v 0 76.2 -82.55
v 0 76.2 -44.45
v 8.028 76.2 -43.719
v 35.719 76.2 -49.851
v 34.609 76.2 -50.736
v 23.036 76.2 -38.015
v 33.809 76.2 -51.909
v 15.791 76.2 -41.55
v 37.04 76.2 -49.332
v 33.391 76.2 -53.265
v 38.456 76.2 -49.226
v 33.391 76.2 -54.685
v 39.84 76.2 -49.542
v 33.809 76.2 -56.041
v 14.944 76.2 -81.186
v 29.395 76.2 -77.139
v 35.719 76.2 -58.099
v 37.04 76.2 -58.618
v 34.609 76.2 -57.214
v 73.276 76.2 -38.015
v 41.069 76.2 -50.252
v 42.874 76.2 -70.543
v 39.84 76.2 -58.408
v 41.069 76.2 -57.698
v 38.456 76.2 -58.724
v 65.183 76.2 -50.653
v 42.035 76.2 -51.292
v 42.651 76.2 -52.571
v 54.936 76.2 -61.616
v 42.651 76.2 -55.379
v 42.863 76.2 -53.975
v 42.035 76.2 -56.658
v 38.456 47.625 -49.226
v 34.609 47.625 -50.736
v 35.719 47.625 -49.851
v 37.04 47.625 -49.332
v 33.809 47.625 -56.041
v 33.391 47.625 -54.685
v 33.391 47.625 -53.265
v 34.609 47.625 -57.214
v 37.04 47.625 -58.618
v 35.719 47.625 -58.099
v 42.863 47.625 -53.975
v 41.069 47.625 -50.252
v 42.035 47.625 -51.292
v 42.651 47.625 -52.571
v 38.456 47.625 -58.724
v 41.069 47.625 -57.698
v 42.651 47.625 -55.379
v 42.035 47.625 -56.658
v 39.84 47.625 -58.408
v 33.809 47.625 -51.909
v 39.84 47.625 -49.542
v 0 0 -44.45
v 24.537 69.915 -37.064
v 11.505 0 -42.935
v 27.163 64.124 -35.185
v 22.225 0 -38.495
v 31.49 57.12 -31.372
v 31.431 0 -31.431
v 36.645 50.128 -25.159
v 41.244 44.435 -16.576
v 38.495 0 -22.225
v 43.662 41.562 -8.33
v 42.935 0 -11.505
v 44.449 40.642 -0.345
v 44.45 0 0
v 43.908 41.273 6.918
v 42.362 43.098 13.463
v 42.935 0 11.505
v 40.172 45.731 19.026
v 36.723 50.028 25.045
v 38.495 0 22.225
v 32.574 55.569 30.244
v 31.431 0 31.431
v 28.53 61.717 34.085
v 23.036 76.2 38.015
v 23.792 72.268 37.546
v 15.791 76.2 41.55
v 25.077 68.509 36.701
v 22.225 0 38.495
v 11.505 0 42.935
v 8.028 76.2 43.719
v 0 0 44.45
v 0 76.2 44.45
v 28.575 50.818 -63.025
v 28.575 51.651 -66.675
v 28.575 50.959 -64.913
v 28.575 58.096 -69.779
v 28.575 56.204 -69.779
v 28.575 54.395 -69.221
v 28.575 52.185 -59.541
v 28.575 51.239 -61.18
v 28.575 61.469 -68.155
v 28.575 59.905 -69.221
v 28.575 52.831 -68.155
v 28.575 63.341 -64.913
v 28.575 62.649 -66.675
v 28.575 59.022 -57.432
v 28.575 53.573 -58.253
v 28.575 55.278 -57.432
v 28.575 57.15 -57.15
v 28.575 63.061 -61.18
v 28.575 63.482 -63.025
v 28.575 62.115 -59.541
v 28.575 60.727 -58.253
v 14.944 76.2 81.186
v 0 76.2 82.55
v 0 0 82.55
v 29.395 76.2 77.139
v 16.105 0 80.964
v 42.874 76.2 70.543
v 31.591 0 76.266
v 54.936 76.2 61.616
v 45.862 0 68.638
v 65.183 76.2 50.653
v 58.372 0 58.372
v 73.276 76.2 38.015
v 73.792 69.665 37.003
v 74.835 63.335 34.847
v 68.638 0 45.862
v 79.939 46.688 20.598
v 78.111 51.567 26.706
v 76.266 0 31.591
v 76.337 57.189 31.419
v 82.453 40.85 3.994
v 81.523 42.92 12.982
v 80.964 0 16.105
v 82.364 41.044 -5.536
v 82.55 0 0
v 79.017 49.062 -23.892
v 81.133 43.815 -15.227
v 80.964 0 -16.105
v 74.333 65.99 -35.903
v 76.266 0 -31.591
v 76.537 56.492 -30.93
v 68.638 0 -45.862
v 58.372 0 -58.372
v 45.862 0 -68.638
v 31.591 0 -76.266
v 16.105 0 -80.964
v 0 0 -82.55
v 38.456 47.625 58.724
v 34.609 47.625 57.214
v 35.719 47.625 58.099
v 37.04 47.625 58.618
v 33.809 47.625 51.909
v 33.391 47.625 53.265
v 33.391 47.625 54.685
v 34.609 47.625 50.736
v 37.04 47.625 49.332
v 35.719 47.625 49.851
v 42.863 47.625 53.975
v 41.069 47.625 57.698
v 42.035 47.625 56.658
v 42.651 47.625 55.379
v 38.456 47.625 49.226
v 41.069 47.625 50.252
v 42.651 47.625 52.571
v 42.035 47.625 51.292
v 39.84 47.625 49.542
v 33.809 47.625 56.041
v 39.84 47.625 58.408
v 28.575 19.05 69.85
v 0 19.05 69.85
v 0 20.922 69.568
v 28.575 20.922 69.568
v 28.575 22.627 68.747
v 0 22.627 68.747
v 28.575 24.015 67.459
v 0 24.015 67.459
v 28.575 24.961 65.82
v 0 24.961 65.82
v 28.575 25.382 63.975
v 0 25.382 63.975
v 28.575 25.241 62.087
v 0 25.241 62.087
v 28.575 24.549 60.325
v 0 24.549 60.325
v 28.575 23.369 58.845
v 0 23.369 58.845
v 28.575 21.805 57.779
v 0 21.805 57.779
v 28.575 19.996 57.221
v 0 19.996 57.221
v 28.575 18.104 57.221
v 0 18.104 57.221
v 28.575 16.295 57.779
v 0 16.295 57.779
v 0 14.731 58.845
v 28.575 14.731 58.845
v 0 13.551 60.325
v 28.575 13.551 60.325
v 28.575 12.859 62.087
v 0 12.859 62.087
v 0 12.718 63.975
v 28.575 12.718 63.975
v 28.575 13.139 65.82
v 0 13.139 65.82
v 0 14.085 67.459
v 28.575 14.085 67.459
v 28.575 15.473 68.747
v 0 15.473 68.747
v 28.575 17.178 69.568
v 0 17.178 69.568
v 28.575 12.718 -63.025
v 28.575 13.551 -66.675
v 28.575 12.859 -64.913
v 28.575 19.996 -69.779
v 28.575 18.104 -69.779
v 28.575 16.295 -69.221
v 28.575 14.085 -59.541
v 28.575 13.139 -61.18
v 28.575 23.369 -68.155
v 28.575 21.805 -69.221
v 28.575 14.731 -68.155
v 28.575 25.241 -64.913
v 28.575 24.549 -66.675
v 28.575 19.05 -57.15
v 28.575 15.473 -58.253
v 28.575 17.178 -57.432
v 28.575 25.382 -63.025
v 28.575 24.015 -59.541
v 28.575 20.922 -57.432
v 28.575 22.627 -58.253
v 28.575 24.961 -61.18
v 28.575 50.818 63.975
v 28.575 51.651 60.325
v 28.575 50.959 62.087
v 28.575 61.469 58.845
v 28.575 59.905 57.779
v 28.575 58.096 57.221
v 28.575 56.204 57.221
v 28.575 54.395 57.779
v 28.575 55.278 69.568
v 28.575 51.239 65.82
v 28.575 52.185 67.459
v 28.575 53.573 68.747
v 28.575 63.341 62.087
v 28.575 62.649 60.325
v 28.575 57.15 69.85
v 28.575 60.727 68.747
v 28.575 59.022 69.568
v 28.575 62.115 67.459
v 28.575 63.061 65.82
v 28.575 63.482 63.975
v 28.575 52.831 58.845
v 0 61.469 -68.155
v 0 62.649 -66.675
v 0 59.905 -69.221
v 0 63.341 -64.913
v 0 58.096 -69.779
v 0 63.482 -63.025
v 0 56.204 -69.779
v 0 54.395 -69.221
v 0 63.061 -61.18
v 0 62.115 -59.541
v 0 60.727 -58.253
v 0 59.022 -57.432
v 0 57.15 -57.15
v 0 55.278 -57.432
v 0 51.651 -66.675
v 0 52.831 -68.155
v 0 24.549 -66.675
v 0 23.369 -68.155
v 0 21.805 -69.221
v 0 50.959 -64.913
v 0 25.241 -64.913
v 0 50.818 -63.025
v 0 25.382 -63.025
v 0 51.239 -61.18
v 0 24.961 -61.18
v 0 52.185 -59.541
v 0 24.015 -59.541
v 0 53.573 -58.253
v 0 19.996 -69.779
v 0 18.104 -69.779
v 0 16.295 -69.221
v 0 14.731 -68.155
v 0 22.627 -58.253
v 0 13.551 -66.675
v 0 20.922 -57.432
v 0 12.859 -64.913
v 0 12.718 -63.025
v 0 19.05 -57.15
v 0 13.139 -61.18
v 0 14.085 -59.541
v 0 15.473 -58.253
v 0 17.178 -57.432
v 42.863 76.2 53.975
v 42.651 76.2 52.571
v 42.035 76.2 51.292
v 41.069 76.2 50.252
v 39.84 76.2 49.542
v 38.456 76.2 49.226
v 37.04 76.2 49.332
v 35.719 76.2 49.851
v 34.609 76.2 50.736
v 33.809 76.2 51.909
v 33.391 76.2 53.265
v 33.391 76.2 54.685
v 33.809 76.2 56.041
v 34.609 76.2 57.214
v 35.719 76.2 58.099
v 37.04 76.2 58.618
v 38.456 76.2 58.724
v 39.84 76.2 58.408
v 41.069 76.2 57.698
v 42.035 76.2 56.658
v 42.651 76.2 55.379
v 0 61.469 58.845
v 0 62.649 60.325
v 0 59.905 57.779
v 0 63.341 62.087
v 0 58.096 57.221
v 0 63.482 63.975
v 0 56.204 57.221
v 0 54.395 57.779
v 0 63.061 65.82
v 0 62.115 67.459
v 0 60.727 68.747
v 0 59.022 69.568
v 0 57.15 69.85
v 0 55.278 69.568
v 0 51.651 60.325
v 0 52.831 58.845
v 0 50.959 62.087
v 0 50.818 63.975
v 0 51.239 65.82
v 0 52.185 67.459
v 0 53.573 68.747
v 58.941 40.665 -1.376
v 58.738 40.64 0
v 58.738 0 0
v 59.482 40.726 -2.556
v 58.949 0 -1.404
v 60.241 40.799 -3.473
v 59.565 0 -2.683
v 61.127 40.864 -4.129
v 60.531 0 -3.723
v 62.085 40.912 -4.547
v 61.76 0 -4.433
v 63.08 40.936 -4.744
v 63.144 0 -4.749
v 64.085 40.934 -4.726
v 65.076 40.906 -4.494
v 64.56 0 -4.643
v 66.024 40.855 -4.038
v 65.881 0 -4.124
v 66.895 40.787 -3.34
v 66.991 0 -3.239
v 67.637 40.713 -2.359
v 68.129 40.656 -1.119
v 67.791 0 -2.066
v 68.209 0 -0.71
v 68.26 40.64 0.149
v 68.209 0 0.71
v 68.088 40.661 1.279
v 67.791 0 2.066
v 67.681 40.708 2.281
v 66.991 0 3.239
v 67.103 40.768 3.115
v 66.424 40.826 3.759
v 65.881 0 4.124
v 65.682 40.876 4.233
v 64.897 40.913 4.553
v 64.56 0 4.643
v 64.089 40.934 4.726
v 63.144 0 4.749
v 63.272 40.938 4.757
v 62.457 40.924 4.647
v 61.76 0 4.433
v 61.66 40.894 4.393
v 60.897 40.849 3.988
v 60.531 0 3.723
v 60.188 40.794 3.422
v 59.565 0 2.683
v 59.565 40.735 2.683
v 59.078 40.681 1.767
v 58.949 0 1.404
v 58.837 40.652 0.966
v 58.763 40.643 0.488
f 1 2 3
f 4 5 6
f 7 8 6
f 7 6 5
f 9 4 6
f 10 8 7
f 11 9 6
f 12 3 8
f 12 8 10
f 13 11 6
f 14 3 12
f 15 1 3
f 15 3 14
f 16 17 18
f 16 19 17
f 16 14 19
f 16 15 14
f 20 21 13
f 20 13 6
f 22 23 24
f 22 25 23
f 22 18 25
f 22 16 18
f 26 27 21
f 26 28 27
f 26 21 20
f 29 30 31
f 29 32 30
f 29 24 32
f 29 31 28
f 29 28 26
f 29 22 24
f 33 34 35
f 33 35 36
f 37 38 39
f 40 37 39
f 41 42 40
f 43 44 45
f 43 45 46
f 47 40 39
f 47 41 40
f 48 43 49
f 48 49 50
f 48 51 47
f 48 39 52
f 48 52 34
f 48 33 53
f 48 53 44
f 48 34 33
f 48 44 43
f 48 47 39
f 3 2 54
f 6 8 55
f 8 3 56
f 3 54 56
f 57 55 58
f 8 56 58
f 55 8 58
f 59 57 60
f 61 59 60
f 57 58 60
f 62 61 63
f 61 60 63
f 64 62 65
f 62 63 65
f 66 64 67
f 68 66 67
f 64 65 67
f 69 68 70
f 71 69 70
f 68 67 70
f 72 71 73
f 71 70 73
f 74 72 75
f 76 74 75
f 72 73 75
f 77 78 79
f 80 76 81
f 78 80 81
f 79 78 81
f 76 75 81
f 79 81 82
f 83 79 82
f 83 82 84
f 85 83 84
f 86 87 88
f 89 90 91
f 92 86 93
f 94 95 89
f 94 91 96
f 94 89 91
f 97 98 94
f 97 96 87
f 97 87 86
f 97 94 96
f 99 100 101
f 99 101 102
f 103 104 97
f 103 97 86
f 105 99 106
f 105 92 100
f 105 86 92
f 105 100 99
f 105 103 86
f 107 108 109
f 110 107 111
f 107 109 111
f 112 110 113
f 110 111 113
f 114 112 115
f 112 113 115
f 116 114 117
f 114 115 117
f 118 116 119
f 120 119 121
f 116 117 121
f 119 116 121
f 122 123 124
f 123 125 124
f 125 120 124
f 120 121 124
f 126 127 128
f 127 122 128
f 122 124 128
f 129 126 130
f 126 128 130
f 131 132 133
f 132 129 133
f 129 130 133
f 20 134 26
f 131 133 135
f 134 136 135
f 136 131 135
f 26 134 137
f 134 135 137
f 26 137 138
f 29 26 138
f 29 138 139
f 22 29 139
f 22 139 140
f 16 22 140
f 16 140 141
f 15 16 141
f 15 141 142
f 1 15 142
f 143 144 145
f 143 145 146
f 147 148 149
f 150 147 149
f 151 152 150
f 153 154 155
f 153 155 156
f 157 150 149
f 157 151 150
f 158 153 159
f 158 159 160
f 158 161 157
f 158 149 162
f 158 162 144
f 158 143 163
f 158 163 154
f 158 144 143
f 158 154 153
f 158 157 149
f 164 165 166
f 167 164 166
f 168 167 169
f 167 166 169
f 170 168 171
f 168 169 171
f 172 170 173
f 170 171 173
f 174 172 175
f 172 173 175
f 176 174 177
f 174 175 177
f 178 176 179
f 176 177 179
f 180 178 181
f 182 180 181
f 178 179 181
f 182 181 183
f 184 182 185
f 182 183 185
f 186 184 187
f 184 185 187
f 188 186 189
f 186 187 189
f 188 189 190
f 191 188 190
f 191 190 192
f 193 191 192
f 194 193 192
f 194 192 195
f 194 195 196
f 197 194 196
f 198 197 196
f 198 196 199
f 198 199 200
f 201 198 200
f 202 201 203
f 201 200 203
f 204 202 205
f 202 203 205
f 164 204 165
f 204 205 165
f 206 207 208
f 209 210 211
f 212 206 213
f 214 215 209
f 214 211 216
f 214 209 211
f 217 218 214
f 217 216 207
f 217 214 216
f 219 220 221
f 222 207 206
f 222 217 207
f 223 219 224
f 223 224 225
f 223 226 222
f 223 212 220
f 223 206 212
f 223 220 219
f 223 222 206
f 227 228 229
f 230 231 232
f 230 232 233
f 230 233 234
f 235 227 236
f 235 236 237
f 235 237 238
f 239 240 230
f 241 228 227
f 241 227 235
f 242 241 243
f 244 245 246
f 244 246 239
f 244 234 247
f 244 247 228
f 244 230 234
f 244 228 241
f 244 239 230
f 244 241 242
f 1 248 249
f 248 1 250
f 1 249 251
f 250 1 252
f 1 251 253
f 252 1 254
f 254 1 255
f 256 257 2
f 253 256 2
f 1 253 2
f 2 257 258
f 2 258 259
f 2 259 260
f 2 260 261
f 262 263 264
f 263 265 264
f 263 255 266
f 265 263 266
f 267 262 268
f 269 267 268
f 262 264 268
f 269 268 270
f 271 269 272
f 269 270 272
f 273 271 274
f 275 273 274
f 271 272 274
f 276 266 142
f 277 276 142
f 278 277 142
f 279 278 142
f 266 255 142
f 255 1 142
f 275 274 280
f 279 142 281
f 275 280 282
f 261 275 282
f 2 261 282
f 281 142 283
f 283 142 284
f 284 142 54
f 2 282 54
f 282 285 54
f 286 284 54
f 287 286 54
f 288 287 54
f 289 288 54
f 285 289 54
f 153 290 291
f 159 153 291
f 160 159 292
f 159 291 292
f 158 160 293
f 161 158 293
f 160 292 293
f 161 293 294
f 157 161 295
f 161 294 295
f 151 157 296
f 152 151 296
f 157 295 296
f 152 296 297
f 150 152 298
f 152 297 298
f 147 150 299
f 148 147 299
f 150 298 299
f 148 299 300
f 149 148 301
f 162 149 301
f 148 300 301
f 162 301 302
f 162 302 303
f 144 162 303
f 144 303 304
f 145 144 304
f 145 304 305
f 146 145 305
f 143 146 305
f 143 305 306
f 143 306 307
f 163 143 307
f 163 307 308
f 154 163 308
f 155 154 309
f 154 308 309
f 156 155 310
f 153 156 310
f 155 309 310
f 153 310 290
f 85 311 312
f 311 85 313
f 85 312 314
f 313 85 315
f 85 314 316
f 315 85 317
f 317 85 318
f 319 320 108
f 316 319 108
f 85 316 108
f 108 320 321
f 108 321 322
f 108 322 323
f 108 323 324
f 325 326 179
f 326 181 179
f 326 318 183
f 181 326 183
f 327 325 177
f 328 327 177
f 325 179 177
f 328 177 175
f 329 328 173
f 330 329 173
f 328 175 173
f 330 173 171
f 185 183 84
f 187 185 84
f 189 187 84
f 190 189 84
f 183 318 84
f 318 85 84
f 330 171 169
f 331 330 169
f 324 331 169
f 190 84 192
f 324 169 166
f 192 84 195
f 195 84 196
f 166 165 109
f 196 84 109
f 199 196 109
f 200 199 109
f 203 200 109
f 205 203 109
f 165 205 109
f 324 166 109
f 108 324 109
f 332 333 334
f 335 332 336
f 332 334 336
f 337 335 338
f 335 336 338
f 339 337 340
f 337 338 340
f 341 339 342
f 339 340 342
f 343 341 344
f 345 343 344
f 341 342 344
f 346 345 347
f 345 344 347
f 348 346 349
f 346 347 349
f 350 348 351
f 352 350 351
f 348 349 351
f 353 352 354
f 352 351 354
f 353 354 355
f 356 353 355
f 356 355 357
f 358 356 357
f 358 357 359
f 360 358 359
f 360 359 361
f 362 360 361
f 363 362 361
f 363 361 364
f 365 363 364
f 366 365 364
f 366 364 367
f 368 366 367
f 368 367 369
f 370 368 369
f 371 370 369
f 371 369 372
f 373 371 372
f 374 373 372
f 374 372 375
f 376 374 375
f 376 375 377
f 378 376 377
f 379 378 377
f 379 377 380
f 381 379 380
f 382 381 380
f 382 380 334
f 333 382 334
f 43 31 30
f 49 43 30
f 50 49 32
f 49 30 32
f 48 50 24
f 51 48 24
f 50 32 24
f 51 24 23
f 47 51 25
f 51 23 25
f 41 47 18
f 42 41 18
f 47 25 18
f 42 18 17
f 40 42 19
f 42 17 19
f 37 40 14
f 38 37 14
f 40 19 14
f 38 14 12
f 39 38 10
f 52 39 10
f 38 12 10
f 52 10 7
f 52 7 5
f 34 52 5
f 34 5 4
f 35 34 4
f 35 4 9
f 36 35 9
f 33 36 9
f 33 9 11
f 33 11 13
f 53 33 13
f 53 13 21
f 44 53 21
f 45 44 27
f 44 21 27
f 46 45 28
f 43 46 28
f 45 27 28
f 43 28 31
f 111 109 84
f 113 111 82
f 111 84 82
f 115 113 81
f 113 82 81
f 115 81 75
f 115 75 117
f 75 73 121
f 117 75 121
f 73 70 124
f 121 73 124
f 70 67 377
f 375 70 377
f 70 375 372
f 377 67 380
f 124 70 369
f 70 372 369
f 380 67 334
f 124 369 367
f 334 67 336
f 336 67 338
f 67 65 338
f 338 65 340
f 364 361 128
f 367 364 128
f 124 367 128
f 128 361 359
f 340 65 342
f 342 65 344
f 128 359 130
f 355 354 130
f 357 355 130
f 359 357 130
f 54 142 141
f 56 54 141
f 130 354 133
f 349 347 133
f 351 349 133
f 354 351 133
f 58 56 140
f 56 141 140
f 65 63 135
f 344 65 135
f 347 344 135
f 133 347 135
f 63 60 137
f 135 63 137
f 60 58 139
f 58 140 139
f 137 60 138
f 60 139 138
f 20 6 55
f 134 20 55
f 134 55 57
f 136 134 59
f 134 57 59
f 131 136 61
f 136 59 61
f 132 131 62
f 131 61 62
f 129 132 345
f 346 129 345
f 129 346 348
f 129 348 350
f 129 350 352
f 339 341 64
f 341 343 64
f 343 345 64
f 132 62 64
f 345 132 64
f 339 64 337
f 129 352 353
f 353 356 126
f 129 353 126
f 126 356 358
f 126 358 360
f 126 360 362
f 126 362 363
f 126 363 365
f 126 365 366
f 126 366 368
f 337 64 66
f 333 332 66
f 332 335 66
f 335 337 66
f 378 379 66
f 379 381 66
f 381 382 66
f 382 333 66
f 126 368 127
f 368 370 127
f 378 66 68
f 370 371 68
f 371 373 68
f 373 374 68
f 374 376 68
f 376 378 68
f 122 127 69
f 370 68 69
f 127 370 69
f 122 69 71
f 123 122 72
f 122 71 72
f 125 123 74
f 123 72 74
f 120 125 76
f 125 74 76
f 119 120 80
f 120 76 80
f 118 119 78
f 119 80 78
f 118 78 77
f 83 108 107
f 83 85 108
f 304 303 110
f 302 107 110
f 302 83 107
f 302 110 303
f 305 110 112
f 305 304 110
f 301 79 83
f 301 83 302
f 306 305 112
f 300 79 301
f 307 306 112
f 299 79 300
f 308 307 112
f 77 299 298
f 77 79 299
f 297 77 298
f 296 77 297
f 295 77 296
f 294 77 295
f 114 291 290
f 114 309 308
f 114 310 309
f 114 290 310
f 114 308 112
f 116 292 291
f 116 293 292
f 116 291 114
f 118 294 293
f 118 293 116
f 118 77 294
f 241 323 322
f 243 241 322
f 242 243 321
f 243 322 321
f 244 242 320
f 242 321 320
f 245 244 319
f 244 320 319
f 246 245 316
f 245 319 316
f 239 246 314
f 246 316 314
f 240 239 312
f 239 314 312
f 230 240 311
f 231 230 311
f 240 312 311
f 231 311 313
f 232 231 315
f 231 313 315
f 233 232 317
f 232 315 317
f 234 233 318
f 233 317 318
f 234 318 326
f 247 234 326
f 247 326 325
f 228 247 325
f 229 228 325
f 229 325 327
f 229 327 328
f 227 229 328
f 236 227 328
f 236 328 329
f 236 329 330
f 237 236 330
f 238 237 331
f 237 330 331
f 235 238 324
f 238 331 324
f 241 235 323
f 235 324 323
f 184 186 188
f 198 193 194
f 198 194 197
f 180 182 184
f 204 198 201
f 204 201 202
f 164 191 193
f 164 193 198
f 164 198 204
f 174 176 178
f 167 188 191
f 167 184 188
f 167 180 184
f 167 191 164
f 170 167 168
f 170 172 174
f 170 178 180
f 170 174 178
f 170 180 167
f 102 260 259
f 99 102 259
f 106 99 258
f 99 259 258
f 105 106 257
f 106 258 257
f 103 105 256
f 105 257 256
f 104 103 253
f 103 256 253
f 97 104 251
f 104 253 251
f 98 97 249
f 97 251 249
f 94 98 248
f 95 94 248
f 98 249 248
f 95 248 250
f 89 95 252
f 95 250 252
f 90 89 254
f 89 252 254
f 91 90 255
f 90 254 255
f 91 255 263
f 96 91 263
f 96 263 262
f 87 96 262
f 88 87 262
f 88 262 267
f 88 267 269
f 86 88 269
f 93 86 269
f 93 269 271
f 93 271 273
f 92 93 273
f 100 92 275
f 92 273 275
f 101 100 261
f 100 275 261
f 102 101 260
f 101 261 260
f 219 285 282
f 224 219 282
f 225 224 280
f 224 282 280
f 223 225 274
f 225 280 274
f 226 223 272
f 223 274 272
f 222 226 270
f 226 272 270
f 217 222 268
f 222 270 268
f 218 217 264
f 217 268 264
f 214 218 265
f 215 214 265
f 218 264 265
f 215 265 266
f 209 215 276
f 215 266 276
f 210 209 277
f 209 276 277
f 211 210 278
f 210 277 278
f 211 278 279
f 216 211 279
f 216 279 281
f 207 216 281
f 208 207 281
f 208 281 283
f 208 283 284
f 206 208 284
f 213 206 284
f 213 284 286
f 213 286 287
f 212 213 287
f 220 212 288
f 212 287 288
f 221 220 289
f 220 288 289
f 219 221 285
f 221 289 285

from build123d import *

# Parameters (mm, degrees)
BOSS_EXTRUDE1_DEPTH = 76.2
SKETCH2_R           = 6.35
CUT_EXTRUDE1_DEPTH  = 28.575
SKETCH4_R           = 38.1
CUT_EXTRUDE3_DEPTH  = 83.55
SKETCH5_R           = 4.7625
CUT_EXTRUDE4_DEPTH  = 77.2000001
SKETCH6_R           = 4.7625
CUT_EXTRUDE5_DEPTH  = 28.575


with BuildPart() as part:
    # Sketch1 → Boss-Extrude1 (new body)
    with BuildSketch(Plane(origin=(0, 0, 0), x_dir=(1, 0, 0), z_dir=(0, 1, 0))):
        with BuildLine():
            Line((0, 82.55), (0, 44.45))
            ThreePointArc((0, 44.45), (44.45, 0), (0, -44.45))
            Line((0, -44.45), (0, -82.55))
            ThreePointArc((0, -82.55), (82.55, 0), (0, 82.55))
        make_face()
    extrude(amount=BOSS_EXTRUDE1_DEPTH)

    # Sketch2 → Cut-Extrude1 (cut)
    with BuildSketch(Plane.ZY):
        with Locations((-63.5, 57.15)):
            Circle(SKETCH2_R)
        with Locations((-63.5, 19.05)):
            Circle(SKETCH2_R)
        with Locations((63.5, 19.05)):
            Circle(SKETCH2_R)
        with Locations((63.5, 57.15)):
            Circle(SKETCH2_R)
    extrude(amount=-CUT_EXTRUDE1_DEPTH, mode=Mode.SUBTRACT)

    # Sketch4 → Cut-Extrude3 (cut, through all)
    with BuildSketch(Plane.ZY):
        with Locations((0, 78.74)):
            Circle(SKETCH4_R)
    extrude(amount=-CUT_EXTRUDE3_DEPTH, mode=Mode.SUBTRACT)

    # Sketch5 → Cut-Extrude4 (cut, through all)
    with BuildSketch(Plane(origin=(0, 0, 0), x_dir=(-1, 0, 0), z_dir=(0, -1, 0))):
        with Locations((-63.5, 0)):
            Circle(SKETCH5_R)
    extrude(amount=-CUT_EXTRUDE4_DEPTH, mode=Mode.SUBTRACT)

    # Sketch6 → Cut-Extrude5 (cut)
    with BuildSketch(Plane(origin=(0, 76.2, 0), x_dir=(1, 0, 0), z_dir=(0, 1, 0))):
        with Locations((38.1, -53.975)):
            Circle(SKETCH6_R)
        with Locations((38.1, 53.975)):
            Circle(SKETCH6_R)
    extrude(amount=-CUT_EXTRUDE5_DEPTH, mode=Mode.SUBTRACT)


solid = part.part
